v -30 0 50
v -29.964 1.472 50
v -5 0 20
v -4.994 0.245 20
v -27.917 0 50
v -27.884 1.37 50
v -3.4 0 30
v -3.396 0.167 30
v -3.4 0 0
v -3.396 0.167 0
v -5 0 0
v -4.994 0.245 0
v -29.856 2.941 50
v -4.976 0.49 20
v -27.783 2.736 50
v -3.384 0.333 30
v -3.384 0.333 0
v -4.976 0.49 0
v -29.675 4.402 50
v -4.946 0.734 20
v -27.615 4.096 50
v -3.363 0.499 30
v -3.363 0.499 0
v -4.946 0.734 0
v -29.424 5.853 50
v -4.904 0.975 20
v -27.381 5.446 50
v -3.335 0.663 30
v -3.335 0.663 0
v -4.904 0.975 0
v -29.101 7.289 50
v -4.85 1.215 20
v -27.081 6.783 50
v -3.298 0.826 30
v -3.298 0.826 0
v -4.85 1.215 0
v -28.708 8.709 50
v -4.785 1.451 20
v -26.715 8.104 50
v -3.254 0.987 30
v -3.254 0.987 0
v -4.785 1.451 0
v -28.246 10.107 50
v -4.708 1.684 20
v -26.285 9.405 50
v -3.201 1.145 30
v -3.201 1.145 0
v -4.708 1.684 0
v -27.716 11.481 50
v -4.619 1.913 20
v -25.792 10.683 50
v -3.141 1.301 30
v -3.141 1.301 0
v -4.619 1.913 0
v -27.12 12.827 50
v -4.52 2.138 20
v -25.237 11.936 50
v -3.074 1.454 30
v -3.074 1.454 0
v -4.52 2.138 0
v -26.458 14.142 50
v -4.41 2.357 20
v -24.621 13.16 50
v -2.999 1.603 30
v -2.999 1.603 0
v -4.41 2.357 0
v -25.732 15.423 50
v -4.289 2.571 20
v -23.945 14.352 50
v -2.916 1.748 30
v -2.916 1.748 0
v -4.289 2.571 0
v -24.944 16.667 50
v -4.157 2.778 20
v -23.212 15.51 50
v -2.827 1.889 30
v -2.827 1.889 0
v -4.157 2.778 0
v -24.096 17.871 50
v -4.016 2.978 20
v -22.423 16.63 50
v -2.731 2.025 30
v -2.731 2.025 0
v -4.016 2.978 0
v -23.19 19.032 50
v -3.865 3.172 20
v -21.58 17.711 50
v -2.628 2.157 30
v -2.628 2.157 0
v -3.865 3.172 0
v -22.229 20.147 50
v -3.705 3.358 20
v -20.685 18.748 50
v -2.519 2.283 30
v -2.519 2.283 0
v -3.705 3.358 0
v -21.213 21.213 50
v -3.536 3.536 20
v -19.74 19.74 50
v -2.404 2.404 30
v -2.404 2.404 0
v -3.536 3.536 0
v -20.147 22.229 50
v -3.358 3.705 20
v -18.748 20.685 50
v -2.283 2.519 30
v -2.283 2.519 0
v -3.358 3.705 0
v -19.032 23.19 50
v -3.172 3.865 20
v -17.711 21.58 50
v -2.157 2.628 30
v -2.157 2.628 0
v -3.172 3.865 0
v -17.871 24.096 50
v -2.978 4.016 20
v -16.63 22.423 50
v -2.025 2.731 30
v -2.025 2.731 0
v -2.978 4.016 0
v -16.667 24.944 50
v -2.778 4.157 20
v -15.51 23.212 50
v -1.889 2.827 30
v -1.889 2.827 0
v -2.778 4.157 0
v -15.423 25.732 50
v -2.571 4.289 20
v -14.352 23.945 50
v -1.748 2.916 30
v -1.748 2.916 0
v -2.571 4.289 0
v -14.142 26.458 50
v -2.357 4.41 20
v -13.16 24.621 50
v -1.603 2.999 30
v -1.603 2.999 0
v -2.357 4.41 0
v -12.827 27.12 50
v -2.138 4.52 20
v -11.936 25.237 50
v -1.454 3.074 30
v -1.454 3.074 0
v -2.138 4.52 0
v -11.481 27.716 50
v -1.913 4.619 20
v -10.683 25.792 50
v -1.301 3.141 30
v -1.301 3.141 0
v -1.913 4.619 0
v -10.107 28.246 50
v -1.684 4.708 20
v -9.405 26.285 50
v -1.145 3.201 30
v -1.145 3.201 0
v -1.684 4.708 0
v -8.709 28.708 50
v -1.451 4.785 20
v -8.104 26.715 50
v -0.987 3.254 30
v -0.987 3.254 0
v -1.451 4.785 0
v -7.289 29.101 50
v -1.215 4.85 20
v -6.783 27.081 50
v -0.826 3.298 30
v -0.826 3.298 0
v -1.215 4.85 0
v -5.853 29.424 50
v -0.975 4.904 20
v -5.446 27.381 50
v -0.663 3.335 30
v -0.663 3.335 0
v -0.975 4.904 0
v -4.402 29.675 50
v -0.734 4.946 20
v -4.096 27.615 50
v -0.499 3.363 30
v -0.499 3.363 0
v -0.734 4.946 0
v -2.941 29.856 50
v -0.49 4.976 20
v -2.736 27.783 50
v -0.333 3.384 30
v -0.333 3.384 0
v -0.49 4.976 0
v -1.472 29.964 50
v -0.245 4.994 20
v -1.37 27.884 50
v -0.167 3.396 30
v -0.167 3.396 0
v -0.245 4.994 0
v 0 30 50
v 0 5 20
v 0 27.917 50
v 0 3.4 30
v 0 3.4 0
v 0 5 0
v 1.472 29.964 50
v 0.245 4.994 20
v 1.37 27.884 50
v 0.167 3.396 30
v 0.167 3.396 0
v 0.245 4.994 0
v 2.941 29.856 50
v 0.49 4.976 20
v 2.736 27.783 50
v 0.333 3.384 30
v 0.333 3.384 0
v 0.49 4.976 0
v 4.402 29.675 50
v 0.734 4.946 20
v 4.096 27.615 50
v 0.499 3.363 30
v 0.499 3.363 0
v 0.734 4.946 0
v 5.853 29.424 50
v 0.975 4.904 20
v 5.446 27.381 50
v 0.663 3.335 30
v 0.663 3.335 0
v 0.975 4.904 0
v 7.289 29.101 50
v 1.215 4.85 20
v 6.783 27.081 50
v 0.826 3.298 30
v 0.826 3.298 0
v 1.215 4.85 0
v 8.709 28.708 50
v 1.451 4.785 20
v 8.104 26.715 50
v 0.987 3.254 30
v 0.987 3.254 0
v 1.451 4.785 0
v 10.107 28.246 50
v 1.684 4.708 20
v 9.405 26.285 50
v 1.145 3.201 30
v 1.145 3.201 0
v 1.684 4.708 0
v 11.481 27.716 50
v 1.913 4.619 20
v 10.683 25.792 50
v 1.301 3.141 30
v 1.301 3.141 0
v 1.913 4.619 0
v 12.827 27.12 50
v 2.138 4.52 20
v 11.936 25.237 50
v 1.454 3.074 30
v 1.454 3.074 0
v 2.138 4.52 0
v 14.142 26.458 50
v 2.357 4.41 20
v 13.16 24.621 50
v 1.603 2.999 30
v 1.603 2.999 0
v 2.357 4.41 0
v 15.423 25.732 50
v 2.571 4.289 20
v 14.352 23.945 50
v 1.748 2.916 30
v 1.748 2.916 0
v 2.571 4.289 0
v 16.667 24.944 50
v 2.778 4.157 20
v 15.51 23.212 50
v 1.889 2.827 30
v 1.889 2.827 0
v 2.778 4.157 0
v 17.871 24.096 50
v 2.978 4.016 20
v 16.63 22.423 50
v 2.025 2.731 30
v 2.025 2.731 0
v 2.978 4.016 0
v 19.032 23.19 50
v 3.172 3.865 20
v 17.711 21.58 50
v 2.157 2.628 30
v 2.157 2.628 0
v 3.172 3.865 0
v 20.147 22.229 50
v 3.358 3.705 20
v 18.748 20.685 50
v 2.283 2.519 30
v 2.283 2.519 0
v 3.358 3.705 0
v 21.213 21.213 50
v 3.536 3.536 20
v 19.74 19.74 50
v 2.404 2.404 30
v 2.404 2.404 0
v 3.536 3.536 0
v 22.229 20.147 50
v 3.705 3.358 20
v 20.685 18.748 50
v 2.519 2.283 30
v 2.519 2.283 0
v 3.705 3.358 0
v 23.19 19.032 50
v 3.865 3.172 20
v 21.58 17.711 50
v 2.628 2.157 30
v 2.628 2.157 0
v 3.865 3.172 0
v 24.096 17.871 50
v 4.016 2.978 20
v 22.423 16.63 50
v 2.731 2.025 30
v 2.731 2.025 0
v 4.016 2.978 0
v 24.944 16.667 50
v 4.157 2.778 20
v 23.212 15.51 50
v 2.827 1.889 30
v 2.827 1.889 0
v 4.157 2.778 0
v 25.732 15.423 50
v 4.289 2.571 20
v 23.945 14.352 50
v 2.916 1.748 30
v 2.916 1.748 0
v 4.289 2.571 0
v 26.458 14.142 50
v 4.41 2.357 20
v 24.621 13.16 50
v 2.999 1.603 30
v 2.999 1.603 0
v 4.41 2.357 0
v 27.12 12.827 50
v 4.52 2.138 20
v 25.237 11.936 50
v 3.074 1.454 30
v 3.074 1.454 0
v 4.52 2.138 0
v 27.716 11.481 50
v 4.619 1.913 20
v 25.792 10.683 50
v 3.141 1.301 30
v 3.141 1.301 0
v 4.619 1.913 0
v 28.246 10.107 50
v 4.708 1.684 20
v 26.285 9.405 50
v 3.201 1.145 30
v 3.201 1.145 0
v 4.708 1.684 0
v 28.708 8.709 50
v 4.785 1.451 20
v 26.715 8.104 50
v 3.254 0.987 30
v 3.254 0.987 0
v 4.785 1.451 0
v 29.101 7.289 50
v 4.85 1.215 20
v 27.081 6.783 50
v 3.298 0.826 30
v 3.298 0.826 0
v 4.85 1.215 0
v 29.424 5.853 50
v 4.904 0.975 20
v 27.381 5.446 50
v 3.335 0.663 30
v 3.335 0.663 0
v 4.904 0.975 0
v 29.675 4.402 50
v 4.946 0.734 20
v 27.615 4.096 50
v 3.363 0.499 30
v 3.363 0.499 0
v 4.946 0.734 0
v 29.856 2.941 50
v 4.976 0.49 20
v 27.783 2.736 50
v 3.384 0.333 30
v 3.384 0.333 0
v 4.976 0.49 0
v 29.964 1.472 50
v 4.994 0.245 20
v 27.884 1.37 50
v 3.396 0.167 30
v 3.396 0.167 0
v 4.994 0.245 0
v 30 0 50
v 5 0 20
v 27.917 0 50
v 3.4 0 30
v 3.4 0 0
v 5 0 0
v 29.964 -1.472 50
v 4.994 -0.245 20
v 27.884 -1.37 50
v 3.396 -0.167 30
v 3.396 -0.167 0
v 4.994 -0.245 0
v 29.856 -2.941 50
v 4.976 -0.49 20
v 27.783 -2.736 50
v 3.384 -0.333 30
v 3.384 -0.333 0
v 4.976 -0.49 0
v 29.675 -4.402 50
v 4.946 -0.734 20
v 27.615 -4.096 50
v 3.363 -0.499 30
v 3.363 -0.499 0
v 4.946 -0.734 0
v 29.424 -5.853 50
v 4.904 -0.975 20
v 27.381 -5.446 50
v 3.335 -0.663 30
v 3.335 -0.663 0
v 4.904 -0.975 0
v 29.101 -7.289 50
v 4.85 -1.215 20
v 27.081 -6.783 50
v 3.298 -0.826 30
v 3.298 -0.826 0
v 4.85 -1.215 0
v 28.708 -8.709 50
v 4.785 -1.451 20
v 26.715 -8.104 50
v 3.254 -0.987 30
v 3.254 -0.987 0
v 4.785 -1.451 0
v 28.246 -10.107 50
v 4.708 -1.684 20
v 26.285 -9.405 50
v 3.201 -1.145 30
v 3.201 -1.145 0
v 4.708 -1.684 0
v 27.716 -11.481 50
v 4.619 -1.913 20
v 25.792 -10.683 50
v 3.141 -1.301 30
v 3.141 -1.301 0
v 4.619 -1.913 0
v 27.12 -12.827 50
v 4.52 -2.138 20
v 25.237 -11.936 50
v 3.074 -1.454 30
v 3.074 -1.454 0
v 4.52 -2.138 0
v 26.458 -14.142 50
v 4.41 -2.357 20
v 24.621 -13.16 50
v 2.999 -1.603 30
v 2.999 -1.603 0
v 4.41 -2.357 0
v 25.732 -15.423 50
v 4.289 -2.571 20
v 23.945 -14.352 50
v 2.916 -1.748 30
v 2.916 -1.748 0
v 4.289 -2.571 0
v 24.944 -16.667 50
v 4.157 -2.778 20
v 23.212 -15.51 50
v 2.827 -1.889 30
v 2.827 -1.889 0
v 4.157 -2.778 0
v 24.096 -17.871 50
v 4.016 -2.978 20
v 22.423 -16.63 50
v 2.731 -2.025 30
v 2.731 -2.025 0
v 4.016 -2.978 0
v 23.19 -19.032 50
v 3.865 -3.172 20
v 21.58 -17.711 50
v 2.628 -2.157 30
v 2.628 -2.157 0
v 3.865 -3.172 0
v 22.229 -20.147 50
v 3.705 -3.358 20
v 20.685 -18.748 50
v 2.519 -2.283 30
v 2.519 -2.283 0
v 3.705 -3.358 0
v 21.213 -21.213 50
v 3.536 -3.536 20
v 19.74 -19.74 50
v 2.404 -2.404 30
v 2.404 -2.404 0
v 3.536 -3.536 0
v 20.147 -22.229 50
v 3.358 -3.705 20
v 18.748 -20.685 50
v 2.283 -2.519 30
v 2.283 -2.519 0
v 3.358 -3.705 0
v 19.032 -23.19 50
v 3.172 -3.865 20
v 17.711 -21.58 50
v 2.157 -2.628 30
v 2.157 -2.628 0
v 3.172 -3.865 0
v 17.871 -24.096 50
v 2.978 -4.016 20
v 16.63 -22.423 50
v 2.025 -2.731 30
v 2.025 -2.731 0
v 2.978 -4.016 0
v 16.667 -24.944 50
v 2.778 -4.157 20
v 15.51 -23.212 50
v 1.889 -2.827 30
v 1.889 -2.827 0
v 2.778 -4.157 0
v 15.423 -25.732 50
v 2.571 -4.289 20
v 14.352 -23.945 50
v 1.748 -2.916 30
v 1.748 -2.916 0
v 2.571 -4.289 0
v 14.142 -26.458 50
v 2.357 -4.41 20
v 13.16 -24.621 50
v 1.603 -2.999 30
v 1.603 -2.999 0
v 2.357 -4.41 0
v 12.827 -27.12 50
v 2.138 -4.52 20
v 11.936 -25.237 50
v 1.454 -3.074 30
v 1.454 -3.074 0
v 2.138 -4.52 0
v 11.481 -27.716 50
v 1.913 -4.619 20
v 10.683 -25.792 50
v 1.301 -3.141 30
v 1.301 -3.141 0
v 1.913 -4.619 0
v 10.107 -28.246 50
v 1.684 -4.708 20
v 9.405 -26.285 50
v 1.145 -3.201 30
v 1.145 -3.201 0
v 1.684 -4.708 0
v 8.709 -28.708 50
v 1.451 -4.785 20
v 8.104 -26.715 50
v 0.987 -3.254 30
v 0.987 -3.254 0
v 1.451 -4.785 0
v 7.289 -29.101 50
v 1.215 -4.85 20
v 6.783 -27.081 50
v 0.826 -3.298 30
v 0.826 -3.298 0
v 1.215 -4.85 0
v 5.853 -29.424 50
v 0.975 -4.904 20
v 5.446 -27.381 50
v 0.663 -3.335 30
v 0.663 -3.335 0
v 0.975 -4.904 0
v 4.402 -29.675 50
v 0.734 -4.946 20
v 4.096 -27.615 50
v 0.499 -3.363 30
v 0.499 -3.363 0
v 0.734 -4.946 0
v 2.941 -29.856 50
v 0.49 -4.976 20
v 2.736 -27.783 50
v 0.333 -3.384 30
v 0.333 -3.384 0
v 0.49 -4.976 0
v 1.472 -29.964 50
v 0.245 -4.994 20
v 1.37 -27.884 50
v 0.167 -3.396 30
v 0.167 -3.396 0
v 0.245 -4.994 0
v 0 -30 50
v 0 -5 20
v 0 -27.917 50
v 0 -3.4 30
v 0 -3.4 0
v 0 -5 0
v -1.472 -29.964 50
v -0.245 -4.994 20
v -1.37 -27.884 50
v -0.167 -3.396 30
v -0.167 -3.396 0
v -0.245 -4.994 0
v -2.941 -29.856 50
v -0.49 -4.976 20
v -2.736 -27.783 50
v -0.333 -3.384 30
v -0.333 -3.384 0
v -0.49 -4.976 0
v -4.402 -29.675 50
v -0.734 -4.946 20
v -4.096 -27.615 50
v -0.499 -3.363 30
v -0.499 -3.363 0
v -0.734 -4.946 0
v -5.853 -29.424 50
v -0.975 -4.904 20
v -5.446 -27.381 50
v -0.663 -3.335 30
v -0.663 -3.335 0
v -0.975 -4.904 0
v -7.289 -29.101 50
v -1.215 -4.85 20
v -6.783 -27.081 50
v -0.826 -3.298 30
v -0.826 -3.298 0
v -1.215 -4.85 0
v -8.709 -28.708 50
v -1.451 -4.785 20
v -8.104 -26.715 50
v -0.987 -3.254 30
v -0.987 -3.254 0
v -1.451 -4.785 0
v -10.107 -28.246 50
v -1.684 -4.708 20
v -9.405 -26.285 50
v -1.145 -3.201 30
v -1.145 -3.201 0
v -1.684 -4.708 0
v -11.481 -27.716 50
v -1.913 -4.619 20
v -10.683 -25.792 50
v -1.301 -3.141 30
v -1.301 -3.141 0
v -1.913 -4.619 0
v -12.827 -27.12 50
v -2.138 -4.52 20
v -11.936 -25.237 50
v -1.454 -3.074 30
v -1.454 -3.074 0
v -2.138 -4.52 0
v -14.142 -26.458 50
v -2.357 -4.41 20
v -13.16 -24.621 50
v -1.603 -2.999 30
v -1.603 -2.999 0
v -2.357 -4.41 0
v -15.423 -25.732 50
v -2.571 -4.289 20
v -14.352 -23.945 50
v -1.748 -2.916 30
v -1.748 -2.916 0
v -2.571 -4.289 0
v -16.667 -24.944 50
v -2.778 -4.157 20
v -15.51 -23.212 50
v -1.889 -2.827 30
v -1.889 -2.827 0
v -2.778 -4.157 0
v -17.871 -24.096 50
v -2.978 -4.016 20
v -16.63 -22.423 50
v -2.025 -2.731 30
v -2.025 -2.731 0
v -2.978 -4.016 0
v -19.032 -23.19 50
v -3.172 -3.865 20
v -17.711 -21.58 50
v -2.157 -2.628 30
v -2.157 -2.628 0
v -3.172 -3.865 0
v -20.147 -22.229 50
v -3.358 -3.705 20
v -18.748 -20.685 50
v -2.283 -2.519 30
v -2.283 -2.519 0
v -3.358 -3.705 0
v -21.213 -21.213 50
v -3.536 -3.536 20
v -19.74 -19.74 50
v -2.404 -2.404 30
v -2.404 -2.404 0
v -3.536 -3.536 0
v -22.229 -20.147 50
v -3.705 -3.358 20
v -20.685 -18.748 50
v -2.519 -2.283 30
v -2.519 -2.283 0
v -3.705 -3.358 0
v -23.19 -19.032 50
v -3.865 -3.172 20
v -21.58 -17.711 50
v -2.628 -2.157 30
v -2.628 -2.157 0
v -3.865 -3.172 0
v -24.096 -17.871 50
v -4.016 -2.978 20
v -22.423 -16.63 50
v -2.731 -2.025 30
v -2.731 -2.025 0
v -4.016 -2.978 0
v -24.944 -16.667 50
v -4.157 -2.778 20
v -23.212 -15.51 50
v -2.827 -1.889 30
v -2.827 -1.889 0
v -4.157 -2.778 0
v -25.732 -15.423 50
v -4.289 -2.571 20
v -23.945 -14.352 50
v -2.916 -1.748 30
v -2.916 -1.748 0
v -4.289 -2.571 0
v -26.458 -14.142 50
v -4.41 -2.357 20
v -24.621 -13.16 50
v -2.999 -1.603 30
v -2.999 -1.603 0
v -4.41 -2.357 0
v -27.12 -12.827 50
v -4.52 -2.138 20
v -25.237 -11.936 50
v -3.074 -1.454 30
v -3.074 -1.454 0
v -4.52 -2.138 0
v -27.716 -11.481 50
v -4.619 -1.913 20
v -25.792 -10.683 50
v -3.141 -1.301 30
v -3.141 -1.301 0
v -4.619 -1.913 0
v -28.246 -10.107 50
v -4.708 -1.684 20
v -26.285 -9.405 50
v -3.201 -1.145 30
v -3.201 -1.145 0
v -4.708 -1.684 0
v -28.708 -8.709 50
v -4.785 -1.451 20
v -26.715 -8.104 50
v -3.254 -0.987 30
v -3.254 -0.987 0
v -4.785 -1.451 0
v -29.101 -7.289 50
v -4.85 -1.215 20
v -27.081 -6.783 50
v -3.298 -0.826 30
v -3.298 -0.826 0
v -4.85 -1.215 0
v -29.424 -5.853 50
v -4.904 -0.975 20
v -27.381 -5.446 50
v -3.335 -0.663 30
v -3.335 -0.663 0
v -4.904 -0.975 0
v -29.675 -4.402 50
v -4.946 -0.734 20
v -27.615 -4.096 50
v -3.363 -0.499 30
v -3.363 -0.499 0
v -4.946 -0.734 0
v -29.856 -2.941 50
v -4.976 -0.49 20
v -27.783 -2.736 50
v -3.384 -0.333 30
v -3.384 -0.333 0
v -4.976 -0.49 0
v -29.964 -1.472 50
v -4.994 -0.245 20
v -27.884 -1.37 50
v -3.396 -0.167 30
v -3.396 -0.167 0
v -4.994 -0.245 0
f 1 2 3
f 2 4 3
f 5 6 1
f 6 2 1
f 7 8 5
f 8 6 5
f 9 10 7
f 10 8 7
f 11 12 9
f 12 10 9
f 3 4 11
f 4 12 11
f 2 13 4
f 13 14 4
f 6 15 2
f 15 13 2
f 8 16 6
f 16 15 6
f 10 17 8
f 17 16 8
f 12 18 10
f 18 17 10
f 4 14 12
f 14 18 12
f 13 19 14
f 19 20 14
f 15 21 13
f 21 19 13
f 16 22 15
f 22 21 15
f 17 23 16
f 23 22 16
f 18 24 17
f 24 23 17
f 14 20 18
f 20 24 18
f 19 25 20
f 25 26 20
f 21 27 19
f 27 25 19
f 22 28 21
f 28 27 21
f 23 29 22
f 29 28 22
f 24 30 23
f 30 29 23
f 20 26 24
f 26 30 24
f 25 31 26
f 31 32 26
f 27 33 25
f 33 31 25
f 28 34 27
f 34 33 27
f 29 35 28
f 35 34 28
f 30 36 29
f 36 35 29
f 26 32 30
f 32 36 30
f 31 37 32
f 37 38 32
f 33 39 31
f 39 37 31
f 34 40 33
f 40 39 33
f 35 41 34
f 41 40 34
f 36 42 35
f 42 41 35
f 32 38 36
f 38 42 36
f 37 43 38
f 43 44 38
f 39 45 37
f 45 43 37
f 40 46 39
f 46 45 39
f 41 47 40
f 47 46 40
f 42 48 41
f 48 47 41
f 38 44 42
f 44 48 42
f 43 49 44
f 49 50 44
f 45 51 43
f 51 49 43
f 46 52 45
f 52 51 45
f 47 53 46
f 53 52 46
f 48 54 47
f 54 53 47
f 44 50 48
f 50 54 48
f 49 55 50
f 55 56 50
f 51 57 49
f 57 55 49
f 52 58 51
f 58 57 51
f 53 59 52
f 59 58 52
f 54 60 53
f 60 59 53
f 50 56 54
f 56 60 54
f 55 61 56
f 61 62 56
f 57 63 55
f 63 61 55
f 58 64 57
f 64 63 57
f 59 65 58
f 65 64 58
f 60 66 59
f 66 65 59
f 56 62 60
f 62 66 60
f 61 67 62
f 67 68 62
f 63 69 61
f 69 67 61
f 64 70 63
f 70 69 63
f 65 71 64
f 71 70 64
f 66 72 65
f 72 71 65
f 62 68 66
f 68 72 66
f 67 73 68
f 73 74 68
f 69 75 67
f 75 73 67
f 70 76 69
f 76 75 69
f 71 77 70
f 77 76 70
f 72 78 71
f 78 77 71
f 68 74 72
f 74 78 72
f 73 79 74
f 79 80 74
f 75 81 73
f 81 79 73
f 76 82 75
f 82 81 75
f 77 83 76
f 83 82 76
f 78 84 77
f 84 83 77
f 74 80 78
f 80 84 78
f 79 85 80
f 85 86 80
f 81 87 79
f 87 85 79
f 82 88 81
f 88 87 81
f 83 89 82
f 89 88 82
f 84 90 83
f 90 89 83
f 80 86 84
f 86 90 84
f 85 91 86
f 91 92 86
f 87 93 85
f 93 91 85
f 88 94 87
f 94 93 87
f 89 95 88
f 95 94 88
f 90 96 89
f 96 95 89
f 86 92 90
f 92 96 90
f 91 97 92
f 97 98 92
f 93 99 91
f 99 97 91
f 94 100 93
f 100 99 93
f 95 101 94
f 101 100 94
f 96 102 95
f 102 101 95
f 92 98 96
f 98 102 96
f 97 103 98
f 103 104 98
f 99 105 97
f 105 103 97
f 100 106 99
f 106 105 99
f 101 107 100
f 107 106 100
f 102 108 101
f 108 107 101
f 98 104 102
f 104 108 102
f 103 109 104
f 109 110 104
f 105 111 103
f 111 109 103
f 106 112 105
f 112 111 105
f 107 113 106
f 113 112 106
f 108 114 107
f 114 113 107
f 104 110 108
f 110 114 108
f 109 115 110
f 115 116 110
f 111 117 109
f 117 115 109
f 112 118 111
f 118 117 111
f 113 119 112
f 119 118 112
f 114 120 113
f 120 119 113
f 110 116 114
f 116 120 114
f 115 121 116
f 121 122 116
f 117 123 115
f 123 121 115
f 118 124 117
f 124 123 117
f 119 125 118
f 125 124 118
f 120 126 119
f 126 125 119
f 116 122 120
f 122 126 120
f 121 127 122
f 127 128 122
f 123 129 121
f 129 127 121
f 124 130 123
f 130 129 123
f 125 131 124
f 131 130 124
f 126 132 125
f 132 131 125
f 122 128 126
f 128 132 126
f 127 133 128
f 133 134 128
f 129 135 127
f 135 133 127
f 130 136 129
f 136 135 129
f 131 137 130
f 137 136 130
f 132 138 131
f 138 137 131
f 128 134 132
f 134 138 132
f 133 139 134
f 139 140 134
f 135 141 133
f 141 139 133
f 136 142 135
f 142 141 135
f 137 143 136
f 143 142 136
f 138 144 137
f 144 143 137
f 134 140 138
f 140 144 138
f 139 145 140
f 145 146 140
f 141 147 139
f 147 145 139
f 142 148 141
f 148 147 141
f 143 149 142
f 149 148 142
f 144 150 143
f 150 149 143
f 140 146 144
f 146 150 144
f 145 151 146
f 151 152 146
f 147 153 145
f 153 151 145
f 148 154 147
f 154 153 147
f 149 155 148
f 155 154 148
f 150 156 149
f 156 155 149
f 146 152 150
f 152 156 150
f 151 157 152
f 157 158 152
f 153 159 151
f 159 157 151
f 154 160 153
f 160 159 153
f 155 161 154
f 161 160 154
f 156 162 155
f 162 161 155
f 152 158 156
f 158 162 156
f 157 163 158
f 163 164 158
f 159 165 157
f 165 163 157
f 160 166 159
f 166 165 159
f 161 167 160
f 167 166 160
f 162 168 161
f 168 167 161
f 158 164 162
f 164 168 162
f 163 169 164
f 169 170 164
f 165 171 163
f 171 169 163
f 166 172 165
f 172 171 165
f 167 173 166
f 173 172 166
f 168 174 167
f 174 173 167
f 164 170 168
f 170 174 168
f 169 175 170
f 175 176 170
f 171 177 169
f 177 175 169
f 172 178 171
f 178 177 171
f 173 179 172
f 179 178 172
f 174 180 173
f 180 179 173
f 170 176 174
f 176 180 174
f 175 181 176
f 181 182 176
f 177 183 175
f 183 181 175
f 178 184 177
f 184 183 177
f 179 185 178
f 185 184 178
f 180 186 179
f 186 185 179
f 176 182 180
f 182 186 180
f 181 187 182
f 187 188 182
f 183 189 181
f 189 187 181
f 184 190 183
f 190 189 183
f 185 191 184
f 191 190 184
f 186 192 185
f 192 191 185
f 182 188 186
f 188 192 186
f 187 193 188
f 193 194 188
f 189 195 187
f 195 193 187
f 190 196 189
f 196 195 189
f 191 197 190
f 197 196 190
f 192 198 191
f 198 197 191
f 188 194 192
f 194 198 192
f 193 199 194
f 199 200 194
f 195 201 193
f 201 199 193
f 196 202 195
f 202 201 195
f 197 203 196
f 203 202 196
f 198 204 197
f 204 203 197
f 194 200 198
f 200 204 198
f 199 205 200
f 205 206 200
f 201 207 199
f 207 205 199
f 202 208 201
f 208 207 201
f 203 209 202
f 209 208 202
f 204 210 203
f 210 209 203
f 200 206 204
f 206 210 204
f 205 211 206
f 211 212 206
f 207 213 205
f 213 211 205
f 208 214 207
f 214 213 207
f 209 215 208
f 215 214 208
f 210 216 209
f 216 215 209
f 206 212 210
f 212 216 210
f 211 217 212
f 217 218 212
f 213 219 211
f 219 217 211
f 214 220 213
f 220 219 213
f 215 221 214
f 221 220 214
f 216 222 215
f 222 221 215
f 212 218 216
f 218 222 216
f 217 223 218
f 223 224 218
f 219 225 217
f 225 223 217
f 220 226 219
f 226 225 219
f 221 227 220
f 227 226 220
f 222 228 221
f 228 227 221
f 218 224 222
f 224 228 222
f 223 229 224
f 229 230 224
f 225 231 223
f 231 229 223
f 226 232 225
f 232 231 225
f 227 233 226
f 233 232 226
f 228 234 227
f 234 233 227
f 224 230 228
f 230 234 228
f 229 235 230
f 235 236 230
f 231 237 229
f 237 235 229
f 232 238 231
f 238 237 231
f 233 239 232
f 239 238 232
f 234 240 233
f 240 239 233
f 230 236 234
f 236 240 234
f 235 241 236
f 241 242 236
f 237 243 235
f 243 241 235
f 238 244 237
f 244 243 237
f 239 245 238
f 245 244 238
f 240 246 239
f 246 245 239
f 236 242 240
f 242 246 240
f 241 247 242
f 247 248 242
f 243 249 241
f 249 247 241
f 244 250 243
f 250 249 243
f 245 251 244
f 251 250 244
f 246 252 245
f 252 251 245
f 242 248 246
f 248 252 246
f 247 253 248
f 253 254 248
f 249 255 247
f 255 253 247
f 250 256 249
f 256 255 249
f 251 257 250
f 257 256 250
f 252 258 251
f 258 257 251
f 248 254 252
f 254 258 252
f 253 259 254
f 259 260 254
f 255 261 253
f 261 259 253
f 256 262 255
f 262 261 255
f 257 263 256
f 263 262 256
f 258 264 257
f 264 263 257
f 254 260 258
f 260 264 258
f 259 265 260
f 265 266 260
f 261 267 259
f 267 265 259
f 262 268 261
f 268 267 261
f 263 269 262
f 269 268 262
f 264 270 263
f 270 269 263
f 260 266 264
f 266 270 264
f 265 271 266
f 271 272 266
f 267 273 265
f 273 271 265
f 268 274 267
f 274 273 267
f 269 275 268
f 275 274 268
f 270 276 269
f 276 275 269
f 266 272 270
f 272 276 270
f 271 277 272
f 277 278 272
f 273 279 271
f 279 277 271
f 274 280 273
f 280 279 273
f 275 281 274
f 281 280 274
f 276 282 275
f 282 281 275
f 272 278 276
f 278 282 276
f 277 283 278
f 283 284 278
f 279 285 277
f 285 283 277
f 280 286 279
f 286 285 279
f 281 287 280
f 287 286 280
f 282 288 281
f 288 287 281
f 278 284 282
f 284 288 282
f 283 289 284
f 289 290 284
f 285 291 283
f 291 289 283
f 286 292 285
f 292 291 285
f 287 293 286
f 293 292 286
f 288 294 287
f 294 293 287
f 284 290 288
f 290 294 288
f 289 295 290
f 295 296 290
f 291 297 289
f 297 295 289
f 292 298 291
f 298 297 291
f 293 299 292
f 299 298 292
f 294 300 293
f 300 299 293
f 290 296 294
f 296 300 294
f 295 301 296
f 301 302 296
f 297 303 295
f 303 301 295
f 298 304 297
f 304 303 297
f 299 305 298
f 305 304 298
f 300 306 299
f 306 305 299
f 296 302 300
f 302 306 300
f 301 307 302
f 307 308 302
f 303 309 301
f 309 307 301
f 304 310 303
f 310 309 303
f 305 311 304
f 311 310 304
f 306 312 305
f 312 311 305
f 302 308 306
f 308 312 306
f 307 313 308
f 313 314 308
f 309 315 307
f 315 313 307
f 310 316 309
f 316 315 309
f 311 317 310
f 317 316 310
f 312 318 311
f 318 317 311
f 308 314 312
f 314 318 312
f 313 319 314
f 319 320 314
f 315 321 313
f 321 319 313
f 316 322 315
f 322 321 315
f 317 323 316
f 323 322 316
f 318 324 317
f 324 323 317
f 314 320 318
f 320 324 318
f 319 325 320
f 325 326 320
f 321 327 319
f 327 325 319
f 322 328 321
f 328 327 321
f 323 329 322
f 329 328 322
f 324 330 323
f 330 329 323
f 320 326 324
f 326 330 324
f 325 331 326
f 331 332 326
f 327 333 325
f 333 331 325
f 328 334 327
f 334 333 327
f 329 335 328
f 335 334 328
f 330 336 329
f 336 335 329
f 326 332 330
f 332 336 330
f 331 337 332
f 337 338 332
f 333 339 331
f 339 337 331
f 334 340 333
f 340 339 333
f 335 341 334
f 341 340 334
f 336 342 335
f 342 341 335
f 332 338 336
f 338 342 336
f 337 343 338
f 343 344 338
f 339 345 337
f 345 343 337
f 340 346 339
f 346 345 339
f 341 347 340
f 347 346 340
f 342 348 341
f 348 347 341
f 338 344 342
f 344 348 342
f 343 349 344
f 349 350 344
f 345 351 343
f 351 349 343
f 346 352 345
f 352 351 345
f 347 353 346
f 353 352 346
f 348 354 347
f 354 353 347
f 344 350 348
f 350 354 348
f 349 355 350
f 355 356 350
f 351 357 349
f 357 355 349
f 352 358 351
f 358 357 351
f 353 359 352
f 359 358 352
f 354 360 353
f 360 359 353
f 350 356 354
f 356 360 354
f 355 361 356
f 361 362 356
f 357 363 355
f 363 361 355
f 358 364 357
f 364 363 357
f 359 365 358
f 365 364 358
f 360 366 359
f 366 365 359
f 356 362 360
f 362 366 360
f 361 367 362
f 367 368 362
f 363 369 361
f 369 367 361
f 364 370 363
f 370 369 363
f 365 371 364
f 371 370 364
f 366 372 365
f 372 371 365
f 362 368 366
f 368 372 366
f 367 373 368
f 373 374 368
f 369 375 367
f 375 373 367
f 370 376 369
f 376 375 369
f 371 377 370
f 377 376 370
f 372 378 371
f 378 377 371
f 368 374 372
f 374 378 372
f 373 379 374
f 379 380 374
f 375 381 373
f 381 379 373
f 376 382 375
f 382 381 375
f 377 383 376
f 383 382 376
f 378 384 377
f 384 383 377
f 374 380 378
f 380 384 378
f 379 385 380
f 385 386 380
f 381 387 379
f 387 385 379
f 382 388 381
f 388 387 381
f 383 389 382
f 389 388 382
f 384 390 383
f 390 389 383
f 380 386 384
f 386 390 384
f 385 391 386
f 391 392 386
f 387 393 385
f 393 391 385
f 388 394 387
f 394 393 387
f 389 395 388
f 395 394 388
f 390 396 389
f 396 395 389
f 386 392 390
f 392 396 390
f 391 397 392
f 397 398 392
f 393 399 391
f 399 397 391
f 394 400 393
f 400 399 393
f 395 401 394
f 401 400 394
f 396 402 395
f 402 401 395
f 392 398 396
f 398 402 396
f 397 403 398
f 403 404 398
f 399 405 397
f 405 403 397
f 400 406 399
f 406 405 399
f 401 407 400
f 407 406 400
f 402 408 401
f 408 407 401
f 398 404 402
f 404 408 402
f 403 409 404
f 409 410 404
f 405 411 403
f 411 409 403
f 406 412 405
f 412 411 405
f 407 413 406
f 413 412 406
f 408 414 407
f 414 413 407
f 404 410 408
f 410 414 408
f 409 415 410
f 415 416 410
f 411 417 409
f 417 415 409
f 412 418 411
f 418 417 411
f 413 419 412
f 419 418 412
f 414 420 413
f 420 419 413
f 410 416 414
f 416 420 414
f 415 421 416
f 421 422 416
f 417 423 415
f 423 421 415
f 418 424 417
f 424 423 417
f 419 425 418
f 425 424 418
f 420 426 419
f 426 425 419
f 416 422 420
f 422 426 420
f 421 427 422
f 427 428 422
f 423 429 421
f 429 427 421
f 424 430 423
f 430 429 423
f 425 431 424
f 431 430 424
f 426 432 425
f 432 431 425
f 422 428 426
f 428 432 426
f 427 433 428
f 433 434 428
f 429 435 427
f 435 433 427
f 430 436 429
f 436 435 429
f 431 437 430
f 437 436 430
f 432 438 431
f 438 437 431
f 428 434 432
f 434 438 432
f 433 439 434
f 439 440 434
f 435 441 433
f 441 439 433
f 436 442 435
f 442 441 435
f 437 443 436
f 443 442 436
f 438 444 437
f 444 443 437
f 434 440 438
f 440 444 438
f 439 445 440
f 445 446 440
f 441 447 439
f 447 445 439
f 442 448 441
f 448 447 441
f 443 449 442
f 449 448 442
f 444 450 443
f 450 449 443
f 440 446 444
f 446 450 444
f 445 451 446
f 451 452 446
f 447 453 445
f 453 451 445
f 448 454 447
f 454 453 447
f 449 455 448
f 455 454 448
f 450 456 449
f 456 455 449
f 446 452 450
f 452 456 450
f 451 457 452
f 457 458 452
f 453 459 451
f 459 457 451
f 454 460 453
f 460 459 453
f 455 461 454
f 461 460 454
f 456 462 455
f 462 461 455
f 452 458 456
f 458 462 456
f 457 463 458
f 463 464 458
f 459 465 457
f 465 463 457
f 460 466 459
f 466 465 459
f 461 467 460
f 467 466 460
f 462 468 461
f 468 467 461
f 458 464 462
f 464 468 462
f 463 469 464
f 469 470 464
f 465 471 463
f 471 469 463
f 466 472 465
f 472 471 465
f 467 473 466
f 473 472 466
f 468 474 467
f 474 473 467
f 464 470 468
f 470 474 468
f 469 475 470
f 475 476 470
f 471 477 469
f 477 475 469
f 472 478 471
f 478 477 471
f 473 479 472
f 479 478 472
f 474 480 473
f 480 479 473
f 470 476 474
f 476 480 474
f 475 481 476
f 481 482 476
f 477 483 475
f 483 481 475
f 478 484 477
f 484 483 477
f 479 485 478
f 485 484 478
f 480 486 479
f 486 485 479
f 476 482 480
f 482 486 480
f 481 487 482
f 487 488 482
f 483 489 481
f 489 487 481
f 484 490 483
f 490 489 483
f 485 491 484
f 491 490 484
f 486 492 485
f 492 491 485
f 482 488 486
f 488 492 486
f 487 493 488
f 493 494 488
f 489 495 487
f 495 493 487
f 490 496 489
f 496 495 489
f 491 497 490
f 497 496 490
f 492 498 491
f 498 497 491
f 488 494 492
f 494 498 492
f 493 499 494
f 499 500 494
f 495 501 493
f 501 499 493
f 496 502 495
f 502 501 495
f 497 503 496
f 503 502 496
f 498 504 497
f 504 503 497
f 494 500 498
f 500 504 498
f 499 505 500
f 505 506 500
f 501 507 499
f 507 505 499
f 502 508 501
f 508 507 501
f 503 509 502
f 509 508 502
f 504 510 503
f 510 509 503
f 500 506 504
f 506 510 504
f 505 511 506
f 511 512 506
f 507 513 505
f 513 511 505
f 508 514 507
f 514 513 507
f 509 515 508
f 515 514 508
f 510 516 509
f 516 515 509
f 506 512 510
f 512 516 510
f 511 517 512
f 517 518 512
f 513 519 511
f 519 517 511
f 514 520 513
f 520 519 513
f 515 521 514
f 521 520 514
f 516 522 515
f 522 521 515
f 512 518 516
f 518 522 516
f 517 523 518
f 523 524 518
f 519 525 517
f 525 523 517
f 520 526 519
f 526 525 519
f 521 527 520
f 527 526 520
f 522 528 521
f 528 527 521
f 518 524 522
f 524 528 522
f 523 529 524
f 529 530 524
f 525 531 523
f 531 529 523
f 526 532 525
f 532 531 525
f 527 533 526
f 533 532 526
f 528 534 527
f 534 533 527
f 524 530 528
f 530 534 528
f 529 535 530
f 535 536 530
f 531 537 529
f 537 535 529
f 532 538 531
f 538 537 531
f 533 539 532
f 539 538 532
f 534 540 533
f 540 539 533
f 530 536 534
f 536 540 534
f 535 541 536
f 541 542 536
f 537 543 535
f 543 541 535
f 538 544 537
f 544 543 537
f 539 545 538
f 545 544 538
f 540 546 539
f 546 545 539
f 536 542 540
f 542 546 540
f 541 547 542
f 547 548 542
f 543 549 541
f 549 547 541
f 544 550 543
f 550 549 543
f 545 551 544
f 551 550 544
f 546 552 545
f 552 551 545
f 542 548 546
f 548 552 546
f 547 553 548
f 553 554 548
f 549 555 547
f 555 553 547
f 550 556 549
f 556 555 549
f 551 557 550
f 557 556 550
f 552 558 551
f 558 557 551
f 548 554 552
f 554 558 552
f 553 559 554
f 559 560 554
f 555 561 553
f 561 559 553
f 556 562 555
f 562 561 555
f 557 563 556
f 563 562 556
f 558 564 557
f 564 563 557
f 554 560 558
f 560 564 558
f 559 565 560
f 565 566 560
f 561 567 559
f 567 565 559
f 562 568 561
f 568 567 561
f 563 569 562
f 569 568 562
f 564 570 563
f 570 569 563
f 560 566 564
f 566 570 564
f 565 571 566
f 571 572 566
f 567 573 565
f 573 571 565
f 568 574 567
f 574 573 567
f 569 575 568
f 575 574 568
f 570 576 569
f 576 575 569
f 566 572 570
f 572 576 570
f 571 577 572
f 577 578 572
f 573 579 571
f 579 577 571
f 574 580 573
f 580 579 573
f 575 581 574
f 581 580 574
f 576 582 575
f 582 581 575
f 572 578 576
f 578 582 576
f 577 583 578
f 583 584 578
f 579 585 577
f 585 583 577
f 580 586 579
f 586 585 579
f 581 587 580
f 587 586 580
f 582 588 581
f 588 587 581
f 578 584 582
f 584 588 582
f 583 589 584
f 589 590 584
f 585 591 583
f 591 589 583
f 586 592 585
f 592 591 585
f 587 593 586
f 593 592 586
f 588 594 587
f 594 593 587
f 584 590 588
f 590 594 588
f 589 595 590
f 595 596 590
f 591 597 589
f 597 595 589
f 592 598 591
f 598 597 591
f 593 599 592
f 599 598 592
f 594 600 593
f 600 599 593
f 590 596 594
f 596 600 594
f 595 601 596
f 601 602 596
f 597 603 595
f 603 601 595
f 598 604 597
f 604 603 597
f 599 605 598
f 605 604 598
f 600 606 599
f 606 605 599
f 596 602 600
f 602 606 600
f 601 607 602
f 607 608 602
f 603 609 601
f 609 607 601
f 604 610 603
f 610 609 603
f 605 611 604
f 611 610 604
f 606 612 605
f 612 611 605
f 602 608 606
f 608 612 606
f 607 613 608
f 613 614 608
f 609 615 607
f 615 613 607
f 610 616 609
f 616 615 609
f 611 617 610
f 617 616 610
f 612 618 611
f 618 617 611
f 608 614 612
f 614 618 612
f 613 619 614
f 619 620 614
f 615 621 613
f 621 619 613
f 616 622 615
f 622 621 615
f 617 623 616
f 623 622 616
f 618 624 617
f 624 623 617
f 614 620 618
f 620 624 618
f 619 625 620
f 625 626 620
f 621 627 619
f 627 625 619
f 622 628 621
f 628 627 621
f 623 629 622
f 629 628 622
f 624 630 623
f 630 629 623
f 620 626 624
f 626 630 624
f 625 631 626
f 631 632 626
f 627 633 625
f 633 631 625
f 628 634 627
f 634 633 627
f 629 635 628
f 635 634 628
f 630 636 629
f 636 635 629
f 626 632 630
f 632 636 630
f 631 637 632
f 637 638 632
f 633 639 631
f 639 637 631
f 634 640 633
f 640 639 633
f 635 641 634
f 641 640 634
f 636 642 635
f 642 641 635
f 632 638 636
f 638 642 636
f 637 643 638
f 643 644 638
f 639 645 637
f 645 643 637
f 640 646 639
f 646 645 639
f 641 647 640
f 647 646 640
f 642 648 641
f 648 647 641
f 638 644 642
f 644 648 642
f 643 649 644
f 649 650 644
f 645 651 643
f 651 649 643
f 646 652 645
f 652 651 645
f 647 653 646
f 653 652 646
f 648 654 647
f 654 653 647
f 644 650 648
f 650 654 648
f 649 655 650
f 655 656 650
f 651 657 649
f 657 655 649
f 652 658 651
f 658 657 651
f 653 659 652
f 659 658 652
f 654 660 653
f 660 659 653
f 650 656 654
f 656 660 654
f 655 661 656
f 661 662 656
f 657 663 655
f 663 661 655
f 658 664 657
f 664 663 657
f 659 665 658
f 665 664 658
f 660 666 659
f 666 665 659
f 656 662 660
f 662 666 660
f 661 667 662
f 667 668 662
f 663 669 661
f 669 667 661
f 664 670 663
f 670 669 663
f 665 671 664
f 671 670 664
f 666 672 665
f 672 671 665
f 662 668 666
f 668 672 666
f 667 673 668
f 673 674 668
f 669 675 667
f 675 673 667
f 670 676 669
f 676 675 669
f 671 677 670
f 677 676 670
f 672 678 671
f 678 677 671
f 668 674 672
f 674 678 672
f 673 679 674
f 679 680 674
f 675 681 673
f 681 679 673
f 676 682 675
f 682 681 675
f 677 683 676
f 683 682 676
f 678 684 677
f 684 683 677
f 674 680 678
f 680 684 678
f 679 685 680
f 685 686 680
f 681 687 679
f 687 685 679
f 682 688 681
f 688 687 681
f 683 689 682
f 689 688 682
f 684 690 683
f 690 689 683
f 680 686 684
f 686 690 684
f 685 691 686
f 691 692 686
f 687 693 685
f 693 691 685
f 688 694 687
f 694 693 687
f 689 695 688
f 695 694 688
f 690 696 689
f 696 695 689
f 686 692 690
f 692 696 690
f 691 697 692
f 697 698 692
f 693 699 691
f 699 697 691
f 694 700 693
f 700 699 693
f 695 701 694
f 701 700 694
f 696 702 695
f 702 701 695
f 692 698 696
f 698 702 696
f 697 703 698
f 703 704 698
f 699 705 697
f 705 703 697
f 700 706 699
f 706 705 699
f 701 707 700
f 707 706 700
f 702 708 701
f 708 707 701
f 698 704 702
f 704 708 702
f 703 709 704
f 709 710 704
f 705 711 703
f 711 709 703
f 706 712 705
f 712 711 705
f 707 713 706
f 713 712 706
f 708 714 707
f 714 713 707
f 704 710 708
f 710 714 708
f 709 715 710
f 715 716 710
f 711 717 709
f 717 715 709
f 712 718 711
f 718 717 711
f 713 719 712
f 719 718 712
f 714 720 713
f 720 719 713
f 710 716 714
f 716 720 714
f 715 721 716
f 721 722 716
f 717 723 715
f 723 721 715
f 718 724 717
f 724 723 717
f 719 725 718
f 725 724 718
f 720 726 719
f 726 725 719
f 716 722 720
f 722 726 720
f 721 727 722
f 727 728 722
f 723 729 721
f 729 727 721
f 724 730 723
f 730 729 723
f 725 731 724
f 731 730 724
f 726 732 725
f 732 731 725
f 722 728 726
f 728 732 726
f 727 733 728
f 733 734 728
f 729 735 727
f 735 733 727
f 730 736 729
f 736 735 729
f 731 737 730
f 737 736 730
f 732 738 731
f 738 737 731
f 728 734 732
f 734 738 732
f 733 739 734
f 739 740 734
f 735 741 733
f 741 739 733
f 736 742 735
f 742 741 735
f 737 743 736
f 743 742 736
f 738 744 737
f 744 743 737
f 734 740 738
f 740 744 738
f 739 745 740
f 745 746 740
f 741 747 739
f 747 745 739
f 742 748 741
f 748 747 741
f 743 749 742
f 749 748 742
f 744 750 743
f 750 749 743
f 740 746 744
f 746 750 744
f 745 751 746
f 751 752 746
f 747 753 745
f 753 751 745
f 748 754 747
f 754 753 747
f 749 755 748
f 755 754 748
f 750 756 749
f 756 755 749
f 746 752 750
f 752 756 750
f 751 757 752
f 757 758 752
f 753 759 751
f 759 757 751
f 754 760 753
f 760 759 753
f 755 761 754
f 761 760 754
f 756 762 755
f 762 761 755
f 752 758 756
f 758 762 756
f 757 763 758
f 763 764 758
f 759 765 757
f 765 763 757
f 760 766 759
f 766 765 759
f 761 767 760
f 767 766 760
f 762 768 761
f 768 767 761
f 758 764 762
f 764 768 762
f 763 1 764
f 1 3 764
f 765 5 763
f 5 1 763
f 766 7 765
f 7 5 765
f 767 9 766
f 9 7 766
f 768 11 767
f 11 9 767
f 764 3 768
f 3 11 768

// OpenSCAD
// Small lab funnel - printed upright, wide opening at top
// Built as a single rotate_extrude of a 2D wall profile (open top and bottom)

$fn = 128;

// ---------------- Dimensions (mm) ----------------
spout_od     = 10;    // spout outer diameter
spout_h      = 20;    // spout height (z = 0 .. 20)
rim_od       = 60;    // cone outer diameter at rim
rim_z        = 50;    // rim height (top of funnel)
wall         = 1.6;   // wall thickness (normal to surface)

// ---------------- Derived values ----------------
spout_r      = spout_od / 2;                // 5.0  outer spout radius
bore_r       = spout_r - wall;              // 3.4  spout bore radius (6.8 mm bore)
rim_r        = rim_od / 2;                  // 30.0 outer rim radius
cone_h       = rim_z - spout_h;             // 30.0 cone height
cone_k       = (rim_r - spout_r) / cone_h;  // radial growth per mm of height
// Radial offset that gives a true 1.6 mm wall measured normal to the cone surface
cone_dr      = wall * sqrt(1 + cone_k * cone_k);
// Inner cone surface: r = spout_r + (z - spout_h)*k - cone_dr
// Height where inner cone meets the rim (offset radially from the outer rim)
inner_rim_r  = rim_r - cone_dr;
// ---------------- Model ----------------
rotate_extrude(convexity = 4)
    polygon(points = [
        [bore_r,      0],        // bottom inner edge of spout
        [spout_r,     0],        // bottom outer edge of spout
        [spout_r,     spout_h],  // top of straight spout (outer)
        [rim_r,       rim_z],    // outer rim
        [inner_rim_r, rim_z],    // inner rim
        [bore_r,      inner_rim_r + cone_dr]   // inner cone meets bore
    ]);
